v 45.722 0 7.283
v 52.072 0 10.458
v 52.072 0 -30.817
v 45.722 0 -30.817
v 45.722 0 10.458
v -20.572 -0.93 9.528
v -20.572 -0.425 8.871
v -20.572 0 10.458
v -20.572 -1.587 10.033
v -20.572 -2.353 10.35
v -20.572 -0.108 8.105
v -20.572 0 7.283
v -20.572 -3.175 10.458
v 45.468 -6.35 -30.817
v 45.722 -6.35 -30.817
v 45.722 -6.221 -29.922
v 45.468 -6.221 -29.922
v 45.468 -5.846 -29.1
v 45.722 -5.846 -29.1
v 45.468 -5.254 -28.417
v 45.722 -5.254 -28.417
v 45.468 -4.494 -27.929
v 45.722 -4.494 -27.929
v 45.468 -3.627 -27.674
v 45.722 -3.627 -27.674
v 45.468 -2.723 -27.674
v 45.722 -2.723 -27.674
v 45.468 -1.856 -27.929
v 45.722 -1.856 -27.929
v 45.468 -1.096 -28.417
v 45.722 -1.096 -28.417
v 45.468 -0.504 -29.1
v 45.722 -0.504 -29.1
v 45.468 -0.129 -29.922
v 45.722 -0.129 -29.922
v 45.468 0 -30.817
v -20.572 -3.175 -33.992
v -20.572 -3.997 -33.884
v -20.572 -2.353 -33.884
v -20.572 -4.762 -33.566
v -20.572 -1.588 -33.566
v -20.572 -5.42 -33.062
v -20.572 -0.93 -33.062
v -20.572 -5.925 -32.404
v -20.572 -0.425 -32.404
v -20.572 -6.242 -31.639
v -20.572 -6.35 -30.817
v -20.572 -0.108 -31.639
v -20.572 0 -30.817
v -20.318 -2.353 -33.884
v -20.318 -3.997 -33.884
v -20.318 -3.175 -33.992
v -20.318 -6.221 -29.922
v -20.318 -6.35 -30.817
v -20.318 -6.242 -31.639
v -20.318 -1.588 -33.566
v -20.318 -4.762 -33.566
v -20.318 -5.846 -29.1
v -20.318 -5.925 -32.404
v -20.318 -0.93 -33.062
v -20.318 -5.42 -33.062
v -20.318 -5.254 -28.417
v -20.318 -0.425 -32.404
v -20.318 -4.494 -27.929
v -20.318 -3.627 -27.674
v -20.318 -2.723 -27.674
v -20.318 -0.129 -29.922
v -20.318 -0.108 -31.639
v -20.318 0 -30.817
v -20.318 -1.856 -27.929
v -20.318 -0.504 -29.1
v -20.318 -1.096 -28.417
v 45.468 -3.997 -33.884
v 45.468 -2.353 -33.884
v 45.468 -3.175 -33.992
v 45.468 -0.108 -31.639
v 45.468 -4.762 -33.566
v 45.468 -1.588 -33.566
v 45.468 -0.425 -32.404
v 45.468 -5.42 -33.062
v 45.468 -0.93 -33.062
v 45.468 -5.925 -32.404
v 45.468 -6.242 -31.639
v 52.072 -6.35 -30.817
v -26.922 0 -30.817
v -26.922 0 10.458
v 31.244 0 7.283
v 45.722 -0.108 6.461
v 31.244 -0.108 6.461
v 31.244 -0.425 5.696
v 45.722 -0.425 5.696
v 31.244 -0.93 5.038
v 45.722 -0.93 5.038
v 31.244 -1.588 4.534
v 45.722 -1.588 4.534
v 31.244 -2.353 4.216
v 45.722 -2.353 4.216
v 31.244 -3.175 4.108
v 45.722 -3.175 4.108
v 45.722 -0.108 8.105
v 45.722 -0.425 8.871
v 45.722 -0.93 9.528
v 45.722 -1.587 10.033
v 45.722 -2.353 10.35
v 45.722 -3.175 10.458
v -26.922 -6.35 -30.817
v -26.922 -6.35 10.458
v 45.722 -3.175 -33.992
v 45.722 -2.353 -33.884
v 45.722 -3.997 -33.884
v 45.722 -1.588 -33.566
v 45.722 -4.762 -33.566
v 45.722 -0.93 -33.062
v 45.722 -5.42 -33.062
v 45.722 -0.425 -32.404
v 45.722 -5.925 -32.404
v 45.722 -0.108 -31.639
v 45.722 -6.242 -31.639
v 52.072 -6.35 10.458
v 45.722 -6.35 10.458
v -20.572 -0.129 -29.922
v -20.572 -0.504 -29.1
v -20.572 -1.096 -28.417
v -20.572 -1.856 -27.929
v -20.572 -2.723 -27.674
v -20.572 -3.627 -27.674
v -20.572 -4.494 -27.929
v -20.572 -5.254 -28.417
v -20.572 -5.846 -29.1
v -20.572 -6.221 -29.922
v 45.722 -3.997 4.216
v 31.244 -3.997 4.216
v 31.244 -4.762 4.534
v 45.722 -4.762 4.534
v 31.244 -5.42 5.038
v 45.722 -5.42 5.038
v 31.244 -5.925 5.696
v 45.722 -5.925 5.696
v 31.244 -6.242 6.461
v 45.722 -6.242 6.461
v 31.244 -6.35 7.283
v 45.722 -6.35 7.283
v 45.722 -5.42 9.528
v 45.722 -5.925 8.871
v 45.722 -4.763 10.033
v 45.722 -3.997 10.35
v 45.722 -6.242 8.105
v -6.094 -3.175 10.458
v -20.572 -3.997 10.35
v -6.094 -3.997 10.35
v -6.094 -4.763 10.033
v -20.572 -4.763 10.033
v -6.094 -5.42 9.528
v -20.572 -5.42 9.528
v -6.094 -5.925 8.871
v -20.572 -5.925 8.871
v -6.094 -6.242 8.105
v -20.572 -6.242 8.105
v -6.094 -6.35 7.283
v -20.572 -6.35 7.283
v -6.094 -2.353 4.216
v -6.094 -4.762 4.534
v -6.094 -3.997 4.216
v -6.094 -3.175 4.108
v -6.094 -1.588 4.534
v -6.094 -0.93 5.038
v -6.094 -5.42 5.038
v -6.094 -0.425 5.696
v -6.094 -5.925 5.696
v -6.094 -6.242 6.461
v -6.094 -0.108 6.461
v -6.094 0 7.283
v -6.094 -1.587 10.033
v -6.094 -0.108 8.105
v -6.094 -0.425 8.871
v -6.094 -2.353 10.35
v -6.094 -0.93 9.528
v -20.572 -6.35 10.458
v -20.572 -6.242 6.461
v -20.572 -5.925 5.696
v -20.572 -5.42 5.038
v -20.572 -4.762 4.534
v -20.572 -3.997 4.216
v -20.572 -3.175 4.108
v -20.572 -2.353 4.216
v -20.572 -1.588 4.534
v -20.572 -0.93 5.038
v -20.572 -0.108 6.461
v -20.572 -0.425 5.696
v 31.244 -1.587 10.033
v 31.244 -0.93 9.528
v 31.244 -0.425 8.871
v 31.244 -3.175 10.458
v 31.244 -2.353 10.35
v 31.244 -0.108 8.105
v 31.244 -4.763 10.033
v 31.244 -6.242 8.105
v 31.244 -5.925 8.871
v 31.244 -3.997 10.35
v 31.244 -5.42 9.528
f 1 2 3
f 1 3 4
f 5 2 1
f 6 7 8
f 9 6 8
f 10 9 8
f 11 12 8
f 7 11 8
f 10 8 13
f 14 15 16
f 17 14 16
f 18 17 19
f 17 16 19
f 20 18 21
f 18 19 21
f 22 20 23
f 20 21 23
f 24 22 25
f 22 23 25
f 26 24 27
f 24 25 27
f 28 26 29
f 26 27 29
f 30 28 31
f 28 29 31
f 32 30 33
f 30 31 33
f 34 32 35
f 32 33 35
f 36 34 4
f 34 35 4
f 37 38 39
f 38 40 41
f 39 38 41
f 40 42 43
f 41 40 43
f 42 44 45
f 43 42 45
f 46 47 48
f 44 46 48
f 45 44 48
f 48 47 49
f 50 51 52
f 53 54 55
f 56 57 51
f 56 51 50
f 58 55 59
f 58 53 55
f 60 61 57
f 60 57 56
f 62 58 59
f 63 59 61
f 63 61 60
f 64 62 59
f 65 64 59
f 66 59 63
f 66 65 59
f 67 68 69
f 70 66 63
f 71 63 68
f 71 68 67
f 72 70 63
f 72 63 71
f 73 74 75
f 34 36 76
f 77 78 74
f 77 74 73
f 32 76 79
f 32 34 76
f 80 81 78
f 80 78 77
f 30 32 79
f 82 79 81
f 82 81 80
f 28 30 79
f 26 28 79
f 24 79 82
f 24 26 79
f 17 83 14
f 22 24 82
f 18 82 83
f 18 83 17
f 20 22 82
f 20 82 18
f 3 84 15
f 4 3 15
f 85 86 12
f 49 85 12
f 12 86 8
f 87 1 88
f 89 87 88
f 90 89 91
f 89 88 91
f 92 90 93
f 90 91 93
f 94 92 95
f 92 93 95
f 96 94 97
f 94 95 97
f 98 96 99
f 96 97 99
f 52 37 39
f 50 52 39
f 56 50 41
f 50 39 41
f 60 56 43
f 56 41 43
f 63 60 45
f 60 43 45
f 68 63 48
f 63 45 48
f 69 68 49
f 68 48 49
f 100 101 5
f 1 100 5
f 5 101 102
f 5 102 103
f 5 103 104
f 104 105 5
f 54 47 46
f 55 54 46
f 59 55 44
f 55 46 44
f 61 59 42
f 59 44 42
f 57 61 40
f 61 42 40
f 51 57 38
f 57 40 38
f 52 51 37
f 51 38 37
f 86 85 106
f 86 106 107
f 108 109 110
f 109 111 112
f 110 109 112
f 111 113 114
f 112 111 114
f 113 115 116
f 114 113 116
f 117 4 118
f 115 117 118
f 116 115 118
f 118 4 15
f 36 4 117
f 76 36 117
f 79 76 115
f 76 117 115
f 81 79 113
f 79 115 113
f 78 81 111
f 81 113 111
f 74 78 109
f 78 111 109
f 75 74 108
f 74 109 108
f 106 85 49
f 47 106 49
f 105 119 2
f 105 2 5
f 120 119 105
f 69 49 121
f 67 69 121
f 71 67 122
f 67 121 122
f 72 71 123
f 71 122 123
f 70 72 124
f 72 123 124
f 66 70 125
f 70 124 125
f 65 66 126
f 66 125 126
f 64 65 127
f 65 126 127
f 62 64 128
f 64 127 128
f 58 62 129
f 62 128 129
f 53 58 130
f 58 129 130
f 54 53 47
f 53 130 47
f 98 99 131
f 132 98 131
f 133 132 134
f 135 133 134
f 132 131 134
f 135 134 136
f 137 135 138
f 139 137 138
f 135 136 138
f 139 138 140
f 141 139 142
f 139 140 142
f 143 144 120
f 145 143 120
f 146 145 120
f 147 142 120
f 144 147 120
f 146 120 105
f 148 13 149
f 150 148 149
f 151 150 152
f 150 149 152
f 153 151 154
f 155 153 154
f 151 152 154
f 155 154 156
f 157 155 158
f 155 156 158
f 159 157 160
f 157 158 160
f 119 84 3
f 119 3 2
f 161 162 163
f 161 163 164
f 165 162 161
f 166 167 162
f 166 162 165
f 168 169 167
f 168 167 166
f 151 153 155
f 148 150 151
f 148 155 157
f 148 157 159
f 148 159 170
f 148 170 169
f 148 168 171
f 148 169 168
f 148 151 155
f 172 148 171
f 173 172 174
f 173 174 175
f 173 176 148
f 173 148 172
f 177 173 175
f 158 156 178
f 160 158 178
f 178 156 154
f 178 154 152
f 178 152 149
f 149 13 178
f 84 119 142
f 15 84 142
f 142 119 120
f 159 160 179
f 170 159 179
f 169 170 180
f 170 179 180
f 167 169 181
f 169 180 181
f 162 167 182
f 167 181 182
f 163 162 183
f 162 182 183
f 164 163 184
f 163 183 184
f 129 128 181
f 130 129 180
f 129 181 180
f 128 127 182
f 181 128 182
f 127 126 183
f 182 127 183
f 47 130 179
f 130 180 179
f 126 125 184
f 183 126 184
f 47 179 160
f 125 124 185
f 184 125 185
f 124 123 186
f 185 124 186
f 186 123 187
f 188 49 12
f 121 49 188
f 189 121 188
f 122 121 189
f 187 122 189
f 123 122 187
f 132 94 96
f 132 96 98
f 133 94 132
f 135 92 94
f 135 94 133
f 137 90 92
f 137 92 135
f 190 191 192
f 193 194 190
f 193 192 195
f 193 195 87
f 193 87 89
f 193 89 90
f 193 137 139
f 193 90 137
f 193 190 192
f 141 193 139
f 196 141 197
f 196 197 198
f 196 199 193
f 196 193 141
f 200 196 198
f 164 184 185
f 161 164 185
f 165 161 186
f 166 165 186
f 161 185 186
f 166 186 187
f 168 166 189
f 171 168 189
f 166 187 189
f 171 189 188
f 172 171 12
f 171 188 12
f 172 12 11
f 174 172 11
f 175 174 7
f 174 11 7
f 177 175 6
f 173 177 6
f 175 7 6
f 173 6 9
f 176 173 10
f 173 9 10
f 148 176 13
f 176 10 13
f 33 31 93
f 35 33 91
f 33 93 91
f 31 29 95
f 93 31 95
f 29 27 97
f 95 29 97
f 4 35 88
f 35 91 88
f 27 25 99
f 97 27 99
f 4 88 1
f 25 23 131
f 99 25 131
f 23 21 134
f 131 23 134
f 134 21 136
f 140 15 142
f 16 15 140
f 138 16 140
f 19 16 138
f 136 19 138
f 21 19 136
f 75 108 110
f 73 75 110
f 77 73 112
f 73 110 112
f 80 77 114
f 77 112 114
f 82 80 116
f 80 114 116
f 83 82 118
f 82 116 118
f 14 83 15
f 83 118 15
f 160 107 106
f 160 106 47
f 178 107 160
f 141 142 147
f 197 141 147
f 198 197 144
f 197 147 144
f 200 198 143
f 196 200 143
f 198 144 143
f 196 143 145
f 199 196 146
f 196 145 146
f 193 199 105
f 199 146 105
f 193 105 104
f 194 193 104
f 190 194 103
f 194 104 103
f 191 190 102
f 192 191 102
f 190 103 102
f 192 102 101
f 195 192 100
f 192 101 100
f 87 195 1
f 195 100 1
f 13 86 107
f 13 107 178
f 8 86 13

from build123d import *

# Parameters (mm, degrees)
F0_W      = 6.35
F0_H      = 41.275
F1_DEPTH  = 6.35
F3_DEPTH  = 14.478
F7_ANGLE  = 180
F9_DEPTH  = 0.254
F11_DEPTH = 0.254


with BuildPart() as f1:
    # F0 (on Front) → F1 (new body)
    with BuildSketch(Plane.XZ):
        with Locations((-23.7466770142, -10.1793586344)):
            Rectangle(F0_W, F0_H)
    extrude(amount=F1_DEPTH)

    # F2 (on face) → F3 (join)
    with BuildSketch(Plane.YZ.offset(-20.5716770142)):
        with BuildLine():
            ThreePointArc((-3.175, 10.4581413656), (-5.4200640303, 9.5282053959), (-6.35, 7.2831413656))
            ThreePointArc((-6.35, 7.2831413656), (-5.4200640303, 5.0380773354), (-3.175, 4.1081413656))
            ThreePointArc((-3.175, 4.1081413656), (-0.9299359697, 5.0380773354), (0, 7.2831413656))
            ThreePointArc((0, 7.2831413656), (-0.9299359697, 9.5282053959), (-3.175, 10.4581413656))
        make_face()
    extrude(amount=F3_DEPTH)


with BuildPart() as f4_1:
    # F4: copy of F1
    add(f1.part.moved(Location((78.994, 0, 0))))


with BuildPart() as f4_1_1:
    # F7: moved
    add(f4_1.part.rotate(Axis((52.0723229858, -3.175, -10.1793586344), (0, 0, 1)), F7_ANGLE))

    # F10 (on face) → F11 (join)
    with BuildSketch(Plane(origin=(45.7223229858, 0, 0), x_dir=(0, -1, 0), z_dir=(-1, 0, 0))):
        with BuildLine():
            ThreePointArc((6.35, -30.8168586344), (3.175, -27.6418586344), (0, -30.8168586344))
            Line((0, -30.8168586344), (6.35, -30.8168586344))
        make_face()
        with BuildLine():
            Line((6.35, -30.8168586344), (0, -30.8168586344))
            ThreePointArc((0, -30.8168586344), (0.9299359697, -33.0619226646), (3.175, -33.9918586344))
            ThreePointArc((3.175, -33.9918586344), (5.4200640303, -33.0619226646), (6.35, -30.8168586344))
        make_face()
    extrude(amount=F11_DEPTH)


with BuildPart() as f1_1:
    add(f1.part)

    # F8 (on face) → F9 (join)
    with BuildSketch(Plane.YZ.offset(-20.5716770142)):
        with BuildLine():
            Line((0, -30.8168586344), (-6.35, -30.8168586344))
            ThreePointArc((-6.35, -30.8168586344), (-5.4200640303, -33.0619226646), (-3.175, -33.9918586344))
            ThreePointArc((-3.175, -33.9918586344), (-0.9299359697, -33.0619226646), (0, -30.8168586344))
        make_face()
        with BuildLine():
            ThreePointArc((0, -30.8168586344), (-3.175, -27.6418586344), (-6.35, -30.8168586344))
            Line((-6.35, -30.8168586344), (0, -30.8168586344))
        make_face()
    extrude(amount=F9_DEPTH)


solid = Compound([f4_1_1.part, f1_1.part])
